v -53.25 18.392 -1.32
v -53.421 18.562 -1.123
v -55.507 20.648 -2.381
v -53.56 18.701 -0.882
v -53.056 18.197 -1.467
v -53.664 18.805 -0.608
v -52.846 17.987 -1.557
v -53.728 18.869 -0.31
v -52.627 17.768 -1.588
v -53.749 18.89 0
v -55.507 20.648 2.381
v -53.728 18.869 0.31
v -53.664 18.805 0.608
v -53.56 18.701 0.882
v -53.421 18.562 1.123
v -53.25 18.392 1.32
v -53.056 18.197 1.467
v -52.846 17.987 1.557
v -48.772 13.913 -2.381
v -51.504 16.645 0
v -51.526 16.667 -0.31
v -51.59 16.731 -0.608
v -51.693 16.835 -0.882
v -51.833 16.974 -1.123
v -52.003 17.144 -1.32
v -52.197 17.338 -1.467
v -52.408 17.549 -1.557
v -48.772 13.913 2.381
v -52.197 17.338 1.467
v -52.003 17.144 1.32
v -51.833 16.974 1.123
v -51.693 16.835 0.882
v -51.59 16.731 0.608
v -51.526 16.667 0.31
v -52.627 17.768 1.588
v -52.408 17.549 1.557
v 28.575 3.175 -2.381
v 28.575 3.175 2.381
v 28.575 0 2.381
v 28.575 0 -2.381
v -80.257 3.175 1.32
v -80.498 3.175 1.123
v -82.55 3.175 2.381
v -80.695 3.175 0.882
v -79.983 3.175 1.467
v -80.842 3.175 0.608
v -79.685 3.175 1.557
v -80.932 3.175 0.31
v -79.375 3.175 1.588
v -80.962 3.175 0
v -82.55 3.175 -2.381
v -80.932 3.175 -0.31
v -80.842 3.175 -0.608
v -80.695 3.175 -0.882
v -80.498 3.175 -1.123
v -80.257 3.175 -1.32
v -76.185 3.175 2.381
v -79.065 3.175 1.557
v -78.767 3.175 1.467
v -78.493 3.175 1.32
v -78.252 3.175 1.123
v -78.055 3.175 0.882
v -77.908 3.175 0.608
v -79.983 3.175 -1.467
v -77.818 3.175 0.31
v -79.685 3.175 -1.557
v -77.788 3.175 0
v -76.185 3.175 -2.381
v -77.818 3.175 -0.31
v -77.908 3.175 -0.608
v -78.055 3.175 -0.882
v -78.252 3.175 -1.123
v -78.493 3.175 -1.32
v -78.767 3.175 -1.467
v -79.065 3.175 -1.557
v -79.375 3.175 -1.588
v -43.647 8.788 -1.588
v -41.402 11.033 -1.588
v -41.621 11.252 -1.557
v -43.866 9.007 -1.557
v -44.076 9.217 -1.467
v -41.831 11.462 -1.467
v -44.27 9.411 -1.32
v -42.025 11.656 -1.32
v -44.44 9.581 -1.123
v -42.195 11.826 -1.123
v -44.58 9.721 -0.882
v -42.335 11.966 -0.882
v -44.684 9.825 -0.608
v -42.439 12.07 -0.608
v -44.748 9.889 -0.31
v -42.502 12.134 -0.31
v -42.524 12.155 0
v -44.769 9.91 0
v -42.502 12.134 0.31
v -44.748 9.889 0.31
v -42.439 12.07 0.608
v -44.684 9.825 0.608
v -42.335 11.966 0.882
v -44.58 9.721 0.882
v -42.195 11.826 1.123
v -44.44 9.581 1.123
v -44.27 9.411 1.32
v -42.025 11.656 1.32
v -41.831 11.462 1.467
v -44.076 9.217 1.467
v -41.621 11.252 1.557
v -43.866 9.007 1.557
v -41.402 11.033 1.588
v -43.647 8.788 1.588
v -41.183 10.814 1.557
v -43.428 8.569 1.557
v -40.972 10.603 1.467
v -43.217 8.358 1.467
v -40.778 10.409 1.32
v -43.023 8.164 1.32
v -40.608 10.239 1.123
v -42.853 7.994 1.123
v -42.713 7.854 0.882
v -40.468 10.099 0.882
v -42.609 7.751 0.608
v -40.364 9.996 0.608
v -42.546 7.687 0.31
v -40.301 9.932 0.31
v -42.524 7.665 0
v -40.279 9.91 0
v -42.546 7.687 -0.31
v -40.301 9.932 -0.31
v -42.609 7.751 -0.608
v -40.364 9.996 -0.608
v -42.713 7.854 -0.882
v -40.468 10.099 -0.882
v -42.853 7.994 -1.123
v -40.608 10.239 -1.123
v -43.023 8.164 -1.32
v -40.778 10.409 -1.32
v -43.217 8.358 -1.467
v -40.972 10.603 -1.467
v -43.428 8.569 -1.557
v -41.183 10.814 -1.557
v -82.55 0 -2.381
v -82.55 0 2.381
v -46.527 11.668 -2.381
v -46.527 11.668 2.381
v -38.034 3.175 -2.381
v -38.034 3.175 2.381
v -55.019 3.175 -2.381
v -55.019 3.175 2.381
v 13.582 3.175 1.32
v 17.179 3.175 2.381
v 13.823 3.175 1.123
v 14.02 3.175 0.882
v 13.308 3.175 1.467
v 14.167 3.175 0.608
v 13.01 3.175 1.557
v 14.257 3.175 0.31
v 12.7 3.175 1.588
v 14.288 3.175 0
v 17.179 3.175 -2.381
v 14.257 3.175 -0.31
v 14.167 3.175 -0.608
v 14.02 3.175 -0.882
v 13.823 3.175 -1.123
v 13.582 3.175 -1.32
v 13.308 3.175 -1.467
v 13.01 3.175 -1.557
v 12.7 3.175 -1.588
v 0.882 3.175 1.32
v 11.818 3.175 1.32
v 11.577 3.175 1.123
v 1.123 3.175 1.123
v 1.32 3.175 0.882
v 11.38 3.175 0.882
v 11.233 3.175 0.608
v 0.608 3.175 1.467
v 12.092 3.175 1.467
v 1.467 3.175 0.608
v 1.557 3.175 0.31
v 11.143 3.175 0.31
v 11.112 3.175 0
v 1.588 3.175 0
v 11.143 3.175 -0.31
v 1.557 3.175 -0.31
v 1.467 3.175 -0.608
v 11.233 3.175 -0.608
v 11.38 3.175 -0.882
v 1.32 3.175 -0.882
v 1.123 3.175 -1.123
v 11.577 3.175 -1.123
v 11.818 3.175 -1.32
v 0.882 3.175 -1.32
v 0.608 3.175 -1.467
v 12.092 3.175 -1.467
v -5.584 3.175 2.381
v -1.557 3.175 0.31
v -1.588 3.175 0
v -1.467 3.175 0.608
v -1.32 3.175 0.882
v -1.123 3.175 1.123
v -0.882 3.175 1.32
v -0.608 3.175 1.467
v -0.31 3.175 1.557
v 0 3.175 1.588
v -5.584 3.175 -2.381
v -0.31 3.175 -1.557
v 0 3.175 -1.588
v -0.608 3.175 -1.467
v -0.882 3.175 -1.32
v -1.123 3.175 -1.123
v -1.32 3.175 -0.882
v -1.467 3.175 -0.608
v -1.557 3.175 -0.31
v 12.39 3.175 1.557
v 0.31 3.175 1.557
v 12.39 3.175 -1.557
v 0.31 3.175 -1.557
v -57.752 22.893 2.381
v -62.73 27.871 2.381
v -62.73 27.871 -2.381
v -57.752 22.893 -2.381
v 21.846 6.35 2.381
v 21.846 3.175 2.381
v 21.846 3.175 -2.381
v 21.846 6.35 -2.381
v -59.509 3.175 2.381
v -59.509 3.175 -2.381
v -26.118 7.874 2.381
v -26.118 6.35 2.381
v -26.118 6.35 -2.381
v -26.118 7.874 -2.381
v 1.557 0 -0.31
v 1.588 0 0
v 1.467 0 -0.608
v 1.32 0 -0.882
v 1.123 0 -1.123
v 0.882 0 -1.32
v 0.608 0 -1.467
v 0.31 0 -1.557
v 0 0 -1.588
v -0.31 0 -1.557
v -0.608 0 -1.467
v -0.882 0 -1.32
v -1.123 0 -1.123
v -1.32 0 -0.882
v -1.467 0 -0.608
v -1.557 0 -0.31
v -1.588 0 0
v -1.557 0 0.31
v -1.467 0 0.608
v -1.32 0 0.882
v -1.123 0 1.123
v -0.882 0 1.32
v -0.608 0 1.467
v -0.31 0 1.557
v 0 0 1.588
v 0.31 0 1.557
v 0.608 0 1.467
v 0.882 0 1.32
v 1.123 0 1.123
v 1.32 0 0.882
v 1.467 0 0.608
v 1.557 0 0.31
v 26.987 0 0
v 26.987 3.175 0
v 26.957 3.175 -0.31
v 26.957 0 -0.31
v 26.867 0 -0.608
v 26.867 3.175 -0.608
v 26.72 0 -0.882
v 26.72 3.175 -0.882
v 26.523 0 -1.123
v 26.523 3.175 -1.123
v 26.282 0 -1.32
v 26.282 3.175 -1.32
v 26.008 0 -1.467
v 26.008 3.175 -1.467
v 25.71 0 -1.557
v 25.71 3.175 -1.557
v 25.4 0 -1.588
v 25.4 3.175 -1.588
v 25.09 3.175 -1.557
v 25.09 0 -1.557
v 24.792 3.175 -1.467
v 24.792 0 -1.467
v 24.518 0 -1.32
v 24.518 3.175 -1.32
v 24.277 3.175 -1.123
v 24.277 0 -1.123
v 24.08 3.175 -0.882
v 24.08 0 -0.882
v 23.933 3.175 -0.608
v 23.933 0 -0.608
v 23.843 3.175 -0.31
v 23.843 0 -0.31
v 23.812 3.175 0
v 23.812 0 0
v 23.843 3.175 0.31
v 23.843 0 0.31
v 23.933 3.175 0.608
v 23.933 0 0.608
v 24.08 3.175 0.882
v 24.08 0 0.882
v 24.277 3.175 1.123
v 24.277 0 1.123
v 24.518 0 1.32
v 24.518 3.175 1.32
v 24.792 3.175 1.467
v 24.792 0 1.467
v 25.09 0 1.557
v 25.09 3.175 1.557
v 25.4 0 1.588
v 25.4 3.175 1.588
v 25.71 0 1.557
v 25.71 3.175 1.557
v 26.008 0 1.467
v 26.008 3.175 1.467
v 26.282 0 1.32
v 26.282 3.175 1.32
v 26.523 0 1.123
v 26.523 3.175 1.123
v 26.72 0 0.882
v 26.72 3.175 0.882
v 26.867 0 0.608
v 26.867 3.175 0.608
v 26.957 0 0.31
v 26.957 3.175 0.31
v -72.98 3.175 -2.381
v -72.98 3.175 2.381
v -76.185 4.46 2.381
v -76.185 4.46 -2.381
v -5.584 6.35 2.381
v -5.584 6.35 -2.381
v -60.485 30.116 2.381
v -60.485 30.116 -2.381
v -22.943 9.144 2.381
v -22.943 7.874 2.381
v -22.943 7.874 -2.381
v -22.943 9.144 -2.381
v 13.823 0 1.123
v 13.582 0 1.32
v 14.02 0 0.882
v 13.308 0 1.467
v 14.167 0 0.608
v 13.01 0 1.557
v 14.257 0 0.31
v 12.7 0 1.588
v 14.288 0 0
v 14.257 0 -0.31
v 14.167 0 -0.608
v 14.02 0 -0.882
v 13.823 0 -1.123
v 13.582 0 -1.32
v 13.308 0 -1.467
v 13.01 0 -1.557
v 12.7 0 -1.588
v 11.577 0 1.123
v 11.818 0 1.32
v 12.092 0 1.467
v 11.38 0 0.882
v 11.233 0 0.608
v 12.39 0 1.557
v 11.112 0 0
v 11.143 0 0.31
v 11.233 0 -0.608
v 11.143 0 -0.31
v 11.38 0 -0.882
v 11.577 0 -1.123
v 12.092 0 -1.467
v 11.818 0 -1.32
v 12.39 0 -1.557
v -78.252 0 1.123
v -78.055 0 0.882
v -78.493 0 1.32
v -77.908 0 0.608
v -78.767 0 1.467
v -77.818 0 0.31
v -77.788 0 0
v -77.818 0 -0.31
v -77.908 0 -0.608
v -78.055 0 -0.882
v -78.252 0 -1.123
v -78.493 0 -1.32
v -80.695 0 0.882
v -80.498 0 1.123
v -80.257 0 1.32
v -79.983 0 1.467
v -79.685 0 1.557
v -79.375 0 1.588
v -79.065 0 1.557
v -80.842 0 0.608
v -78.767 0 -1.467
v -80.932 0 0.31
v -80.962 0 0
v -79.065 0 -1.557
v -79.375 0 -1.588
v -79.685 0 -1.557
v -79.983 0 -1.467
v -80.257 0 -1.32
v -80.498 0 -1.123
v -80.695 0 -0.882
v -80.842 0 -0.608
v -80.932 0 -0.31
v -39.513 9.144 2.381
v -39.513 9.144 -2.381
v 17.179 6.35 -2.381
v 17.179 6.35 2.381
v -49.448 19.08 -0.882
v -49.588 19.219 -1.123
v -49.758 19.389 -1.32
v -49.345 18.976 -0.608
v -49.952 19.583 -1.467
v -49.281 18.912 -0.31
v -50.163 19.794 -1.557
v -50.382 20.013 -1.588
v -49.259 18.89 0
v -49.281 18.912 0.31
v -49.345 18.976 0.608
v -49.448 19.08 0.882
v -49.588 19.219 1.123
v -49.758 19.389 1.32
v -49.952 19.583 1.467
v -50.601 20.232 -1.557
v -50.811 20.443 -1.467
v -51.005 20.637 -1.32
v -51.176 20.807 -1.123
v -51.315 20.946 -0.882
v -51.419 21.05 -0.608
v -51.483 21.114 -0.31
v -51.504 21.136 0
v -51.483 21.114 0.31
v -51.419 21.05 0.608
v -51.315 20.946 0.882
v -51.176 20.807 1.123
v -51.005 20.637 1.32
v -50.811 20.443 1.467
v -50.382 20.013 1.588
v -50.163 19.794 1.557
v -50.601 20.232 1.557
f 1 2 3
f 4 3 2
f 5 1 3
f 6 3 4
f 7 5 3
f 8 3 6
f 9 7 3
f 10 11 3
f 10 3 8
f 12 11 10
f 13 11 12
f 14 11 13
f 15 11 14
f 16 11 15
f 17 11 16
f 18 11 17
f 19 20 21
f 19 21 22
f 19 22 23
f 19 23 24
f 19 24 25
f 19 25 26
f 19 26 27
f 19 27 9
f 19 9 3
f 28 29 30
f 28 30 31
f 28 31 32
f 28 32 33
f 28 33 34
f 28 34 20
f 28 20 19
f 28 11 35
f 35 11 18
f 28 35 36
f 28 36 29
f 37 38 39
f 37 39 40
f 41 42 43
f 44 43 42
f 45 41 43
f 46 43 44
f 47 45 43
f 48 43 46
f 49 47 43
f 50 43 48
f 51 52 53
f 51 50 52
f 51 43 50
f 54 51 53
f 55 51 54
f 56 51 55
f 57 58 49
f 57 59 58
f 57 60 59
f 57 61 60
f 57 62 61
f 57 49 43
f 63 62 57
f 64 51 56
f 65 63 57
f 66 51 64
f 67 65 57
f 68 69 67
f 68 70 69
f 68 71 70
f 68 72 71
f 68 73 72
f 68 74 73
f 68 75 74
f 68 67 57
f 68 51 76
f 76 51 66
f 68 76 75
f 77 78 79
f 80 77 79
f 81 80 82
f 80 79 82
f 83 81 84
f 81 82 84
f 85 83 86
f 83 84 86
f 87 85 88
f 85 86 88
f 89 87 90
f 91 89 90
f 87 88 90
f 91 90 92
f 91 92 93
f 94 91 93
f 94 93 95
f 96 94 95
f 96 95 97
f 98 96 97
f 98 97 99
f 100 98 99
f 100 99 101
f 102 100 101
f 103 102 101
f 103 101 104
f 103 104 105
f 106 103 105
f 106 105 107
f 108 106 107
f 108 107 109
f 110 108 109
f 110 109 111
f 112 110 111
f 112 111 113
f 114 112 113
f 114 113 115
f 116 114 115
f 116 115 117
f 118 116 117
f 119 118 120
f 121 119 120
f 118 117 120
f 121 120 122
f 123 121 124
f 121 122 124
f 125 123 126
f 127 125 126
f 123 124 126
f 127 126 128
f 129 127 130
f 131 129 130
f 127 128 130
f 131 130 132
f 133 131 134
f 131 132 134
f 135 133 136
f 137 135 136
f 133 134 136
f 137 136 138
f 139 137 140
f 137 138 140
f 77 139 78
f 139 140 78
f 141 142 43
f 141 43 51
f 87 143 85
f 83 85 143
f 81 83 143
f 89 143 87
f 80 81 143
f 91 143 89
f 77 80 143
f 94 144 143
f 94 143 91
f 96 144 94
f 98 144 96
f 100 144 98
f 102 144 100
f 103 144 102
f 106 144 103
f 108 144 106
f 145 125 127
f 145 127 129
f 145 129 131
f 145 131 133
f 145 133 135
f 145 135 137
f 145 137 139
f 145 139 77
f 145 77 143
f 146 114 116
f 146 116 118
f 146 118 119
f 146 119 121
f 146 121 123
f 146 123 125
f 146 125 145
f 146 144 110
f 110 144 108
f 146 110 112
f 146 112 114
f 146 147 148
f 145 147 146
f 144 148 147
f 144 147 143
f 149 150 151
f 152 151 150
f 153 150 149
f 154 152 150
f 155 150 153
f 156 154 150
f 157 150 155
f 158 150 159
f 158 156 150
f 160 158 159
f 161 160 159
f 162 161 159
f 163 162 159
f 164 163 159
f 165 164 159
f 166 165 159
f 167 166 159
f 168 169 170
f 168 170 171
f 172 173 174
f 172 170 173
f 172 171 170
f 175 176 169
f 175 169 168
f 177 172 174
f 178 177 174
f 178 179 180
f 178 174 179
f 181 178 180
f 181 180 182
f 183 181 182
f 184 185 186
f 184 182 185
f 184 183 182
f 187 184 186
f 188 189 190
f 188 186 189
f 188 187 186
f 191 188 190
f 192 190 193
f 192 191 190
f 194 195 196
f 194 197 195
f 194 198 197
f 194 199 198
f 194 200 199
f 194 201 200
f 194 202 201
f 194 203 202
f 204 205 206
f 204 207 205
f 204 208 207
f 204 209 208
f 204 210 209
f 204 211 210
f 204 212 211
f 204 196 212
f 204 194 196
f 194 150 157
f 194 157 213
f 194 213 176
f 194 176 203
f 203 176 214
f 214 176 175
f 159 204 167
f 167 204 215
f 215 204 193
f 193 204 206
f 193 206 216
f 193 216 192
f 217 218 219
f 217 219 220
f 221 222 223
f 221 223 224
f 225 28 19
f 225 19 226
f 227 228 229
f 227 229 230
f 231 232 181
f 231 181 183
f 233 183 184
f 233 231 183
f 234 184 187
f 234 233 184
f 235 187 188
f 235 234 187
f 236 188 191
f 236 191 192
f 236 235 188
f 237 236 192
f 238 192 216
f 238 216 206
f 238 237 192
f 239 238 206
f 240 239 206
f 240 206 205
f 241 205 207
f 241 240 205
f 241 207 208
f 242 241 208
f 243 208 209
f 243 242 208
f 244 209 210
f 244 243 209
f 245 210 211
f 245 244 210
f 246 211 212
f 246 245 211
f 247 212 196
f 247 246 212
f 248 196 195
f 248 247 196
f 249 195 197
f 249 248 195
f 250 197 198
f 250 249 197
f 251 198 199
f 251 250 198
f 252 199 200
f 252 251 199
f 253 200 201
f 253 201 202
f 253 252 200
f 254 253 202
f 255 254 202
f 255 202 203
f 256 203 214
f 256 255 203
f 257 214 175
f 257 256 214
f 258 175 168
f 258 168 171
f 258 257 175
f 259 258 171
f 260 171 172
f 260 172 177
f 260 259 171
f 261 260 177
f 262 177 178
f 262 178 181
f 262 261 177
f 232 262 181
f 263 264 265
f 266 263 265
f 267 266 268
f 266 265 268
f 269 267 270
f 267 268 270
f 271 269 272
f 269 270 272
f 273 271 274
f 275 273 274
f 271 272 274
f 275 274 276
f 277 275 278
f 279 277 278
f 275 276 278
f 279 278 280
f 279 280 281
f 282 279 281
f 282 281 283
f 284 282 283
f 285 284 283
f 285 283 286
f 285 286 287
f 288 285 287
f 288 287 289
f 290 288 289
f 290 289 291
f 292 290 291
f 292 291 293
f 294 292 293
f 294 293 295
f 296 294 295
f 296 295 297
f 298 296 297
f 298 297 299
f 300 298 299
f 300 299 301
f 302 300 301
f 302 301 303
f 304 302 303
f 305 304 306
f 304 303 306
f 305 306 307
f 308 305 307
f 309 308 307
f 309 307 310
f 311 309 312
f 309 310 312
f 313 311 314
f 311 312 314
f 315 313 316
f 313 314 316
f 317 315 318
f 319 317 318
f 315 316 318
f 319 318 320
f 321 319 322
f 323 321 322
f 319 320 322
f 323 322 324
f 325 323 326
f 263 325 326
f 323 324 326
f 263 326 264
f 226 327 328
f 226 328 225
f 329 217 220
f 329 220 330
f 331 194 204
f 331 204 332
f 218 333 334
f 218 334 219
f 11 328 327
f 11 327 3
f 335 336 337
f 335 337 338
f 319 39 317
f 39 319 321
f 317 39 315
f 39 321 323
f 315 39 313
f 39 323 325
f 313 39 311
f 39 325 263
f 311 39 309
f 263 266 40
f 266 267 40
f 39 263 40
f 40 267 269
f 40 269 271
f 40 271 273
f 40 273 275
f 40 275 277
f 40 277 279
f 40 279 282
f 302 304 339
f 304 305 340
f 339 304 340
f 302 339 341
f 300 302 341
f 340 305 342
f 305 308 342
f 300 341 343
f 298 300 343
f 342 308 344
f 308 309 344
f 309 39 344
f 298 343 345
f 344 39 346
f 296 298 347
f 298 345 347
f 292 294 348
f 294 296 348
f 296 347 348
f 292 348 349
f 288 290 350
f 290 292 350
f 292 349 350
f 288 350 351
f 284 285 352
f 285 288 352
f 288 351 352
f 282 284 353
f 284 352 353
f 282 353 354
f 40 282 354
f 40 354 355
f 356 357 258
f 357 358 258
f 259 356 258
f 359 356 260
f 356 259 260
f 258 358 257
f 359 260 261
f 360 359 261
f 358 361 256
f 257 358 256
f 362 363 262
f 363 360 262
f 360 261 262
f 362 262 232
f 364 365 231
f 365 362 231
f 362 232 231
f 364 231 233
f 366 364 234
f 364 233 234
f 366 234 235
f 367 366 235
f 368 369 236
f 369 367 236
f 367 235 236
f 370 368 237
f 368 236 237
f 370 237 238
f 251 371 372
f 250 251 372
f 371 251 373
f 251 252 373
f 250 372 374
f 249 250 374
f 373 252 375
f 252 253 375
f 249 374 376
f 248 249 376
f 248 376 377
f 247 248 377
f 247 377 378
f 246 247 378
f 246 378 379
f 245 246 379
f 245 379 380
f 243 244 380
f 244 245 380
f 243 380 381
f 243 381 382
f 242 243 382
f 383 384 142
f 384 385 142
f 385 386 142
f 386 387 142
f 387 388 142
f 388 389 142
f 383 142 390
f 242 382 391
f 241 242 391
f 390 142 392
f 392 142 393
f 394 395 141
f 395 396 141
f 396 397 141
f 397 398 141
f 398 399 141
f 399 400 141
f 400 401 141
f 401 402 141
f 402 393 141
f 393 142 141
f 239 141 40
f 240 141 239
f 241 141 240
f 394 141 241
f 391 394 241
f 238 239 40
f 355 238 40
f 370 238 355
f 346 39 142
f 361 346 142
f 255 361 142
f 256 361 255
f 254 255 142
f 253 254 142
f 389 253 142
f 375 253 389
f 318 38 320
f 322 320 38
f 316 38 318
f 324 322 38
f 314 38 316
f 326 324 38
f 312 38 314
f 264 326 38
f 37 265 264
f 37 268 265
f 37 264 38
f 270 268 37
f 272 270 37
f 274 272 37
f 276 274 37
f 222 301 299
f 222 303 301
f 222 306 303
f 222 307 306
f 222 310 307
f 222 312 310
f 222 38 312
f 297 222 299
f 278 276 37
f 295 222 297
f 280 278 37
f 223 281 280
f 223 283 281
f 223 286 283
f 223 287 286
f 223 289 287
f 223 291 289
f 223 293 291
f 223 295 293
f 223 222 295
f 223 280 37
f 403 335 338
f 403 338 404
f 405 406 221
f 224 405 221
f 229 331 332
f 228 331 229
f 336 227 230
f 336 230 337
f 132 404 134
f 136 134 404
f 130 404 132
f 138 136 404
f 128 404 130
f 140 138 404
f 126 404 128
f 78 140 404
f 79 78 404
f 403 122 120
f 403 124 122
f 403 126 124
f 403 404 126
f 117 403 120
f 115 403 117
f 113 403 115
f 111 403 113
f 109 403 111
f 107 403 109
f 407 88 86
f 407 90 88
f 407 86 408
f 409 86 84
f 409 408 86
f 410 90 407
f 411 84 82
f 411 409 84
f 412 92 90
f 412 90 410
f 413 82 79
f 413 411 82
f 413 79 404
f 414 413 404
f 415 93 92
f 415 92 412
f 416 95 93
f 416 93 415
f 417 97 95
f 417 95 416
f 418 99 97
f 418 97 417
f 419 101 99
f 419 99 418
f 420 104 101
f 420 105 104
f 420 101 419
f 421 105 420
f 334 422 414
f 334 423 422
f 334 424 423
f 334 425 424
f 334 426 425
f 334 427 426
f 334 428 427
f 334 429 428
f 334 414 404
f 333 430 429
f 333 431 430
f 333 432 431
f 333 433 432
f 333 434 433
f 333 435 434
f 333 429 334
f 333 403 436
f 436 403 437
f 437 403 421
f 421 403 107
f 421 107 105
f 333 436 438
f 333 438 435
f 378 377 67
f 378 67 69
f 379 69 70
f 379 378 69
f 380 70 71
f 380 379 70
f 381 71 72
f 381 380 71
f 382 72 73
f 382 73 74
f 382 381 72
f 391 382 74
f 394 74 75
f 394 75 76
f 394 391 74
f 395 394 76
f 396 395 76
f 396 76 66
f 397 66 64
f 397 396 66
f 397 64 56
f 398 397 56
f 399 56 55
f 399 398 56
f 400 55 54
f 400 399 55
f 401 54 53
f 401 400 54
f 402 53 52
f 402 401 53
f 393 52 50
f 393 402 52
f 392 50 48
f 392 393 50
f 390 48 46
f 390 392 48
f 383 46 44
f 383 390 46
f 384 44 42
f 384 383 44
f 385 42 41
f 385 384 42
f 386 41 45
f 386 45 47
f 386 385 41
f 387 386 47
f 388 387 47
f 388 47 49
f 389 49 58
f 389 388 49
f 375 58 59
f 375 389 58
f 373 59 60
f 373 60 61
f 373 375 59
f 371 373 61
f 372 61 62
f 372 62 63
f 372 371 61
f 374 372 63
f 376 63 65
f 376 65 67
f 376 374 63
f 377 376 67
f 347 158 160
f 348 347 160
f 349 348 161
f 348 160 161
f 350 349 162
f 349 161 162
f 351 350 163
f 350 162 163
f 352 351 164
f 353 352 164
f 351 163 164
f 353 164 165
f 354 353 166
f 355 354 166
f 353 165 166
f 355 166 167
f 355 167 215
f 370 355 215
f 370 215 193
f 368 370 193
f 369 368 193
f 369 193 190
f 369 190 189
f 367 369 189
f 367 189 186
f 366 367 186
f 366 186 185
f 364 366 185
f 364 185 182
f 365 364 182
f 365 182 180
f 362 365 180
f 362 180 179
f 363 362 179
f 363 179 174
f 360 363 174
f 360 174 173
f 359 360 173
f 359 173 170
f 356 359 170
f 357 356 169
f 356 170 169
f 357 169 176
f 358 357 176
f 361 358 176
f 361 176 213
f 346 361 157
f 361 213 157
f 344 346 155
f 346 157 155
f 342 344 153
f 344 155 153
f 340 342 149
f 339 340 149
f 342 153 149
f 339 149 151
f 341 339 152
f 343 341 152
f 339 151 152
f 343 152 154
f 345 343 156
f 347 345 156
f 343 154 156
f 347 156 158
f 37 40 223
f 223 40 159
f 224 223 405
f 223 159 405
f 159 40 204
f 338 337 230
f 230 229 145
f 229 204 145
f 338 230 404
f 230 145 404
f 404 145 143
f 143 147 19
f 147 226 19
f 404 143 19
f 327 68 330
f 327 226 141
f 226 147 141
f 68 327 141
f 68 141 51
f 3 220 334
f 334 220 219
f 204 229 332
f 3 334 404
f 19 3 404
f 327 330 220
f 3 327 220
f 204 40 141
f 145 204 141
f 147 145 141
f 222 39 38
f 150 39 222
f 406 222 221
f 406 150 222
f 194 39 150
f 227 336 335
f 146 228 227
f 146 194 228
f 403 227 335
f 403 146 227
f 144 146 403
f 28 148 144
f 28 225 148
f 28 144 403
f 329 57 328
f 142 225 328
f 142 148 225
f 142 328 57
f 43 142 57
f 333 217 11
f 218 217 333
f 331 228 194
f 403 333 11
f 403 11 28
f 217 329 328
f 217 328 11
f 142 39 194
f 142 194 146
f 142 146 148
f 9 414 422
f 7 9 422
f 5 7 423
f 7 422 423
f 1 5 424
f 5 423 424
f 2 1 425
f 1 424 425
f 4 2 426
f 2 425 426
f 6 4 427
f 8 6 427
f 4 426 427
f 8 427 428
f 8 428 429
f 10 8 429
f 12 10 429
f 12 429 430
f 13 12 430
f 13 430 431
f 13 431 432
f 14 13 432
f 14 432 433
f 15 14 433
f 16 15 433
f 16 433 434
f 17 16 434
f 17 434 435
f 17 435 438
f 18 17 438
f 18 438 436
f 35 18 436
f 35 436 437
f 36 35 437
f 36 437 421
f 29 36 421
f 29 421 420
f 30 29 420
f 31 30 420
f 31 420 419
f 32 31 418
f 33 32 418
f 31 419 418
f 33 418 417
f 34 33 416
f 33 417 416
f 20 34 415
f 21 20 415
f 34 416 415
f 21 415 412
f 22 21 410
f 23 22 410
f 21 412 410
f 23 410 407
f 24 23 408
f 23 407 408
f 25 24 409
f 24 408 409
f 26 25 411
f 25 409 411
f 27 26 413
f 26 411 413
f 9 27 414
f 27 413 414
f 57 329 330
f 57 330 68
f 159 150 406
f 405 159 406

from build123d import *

# Parameters (mm, degrees)
SKETCH1_W           = 85.725
SKETCH1_H           = 4.7625
SKETCH1_R           = 1.5875
BOSS_EXTRUDE1_DEPTH = 3.175
BOSS_EXTRUDE2_DEPTH = 4.7625
CUT_EXTRUDE1_REACH  = 38.898
SKETCH3_R           = 1.5875
SKETCH4_W           = 4.7625
SKETCH4_H           = 3.175
BOSS_EXTRUDE3_DEPTH = 25.4
SKETCH5_R           = 1.5875
CUT_EXTRUDE2_DEPTH  = 4.175
SKETCH6_W           = 4.667184745
SKETCH6_H           = 3.175
BOSS_EXTRUDE4_DEPTH = 4.7625


with BuildPart() as part:
    # Sketch1 → Boss-Extrude1 (new body)
    with BuildSketch(Plane(origin=(0, 0, 0), x_dir=(1, 0, 0), z_dir=(0, 1, 0))):
        with Locations((-39.6875, 0)):
            Rectangle(SKETCH1_W, SKETCH1_H)
        Circle(SKETCH1_R, mode=Mode.SUBTRACT)
        with Locations((-79.375, 0)):
            Circle(SKETCH1_R, mode=Mode.SUBTRACT)
    extrude(amount=BOSS_EXTRUDE1_DEPTH)

    # Sketch2 → Boss-Extrude2 (add)
    with BuildSketch(Plane.XY.offset(2.38125)):
        Polygon((-5.58425135, 3.175), (-5.58425135, 6.35), (-26.118044342, 6.35), (-26.118044342, 7.874), (-22.943044342, 7.874), (-22.943044342, 9.144), (-39.512783425, 9.144), (-60.484551788, 30.115768363), (-62.729615818, 27.870704333), (-57.751955743, 22.893044257), (-76.185480906, 4.459519094), (-76.185480906, 3.175), (-72.979871939, 3.175), (-55.506891712, 20.647980227), (-48.771699622, 13.912788136), (-59.509487758, 3.175), (-55.019359697, 3.175), (-46.526635591, 11.667724106), (-38.033911485, 3.175), align=None)
    extrude(amount=-BOSS_EXTRUDE2_DEPTH)

    # Sketch3 → Cut-Extrude1 (cut, up to next)
    with BuildSketch(Plane(origin=(-15.184391712, -15.184391712, 0), x_dir=(0, 0, -1), z_dir=(0.707106781, 0.707106781, 0)), mode=Mode.PRIVATE) as cut_extrude1_sk1:
        with Locations((0, 49.776600757)):
            Circle(SKETCH3_R)
    cut_extrude1_tool1 = extrude(cut_extrude1_sk1.sketch, amount=-CUT_EXTRUDE1_REACH, mode=Mode.PRIVATE) & part.part
    add(cut_extrude1_tool1.solids().sort_by_distance((-50.381764, 20.01298, 0))[0], mode=Mode.SUBTRACT)
    # Sketch3 → Cut-Extrude1 (cut, up to next)
    with BuildSketch(Plane(origin=(-15.184391712, -15.184391712, 0), x_dir=(0, 0, -1), z_dir=(0.707106781, 0.707106781, 0)), mode=Mode.PRIVATE) as cut_extrude1_sk2:
        with Locations((0, 37.076600757)):
            Circle(SKETCH3_R)
    cut_extrude1_tool2 = extrude(cut_extrude1_sk2.sketch, amount=-CUT_EXTRUDE1_REACH, mode=Mode.PRIVATE) & part.part
    add(cut_extrude1_tool2.solids().sort_by_distance((-41.401508, 11.032724, 0))[0], mode=Mode.SUBTRACT)

    # Sketch4 → Boss-Extrude3 (add)
    with BuildSketch(Plane(origin=(3.175, 0, 0), x_dir=(0, 0, -1), z_dir=(1, 0, 0))):
        with Locations((0, 1.5875)):
            Rectangle(SKETCH4_W, SKETCH4_H)
    extrude(amount=BOSS_EXTRUDE3_DEPTH)

    # Sketch5 → Cut-Extrude2 (cut, through all)
    with BuildSketch(Plane(origin=(0, 3.175, 0), x_dir=(1, 0, 0), z_dir=(0, 1, 0))):
        with Locations((12.7, 0)):
            Circle(SKETCH5_R)
        with Locations((25.4, 0)):
            Circle(SKETCH5_R)
    extrude(amount=-CUT_EXTRUDE2_DEPTH, mode=Mode.SUBTRACT)

    # Sketch6 → Boss-Extrude4 (add)
    with BuildSketch(Plane.XY.offset(2.38125)):
        with Locations((19.512903732, 4.7625)):
            Rectangle(SKETCH6_W, SKETCH6_H)
    extrude(amount=-BOSS_EXTRUDE4_DEPTH)


solid = part.part
